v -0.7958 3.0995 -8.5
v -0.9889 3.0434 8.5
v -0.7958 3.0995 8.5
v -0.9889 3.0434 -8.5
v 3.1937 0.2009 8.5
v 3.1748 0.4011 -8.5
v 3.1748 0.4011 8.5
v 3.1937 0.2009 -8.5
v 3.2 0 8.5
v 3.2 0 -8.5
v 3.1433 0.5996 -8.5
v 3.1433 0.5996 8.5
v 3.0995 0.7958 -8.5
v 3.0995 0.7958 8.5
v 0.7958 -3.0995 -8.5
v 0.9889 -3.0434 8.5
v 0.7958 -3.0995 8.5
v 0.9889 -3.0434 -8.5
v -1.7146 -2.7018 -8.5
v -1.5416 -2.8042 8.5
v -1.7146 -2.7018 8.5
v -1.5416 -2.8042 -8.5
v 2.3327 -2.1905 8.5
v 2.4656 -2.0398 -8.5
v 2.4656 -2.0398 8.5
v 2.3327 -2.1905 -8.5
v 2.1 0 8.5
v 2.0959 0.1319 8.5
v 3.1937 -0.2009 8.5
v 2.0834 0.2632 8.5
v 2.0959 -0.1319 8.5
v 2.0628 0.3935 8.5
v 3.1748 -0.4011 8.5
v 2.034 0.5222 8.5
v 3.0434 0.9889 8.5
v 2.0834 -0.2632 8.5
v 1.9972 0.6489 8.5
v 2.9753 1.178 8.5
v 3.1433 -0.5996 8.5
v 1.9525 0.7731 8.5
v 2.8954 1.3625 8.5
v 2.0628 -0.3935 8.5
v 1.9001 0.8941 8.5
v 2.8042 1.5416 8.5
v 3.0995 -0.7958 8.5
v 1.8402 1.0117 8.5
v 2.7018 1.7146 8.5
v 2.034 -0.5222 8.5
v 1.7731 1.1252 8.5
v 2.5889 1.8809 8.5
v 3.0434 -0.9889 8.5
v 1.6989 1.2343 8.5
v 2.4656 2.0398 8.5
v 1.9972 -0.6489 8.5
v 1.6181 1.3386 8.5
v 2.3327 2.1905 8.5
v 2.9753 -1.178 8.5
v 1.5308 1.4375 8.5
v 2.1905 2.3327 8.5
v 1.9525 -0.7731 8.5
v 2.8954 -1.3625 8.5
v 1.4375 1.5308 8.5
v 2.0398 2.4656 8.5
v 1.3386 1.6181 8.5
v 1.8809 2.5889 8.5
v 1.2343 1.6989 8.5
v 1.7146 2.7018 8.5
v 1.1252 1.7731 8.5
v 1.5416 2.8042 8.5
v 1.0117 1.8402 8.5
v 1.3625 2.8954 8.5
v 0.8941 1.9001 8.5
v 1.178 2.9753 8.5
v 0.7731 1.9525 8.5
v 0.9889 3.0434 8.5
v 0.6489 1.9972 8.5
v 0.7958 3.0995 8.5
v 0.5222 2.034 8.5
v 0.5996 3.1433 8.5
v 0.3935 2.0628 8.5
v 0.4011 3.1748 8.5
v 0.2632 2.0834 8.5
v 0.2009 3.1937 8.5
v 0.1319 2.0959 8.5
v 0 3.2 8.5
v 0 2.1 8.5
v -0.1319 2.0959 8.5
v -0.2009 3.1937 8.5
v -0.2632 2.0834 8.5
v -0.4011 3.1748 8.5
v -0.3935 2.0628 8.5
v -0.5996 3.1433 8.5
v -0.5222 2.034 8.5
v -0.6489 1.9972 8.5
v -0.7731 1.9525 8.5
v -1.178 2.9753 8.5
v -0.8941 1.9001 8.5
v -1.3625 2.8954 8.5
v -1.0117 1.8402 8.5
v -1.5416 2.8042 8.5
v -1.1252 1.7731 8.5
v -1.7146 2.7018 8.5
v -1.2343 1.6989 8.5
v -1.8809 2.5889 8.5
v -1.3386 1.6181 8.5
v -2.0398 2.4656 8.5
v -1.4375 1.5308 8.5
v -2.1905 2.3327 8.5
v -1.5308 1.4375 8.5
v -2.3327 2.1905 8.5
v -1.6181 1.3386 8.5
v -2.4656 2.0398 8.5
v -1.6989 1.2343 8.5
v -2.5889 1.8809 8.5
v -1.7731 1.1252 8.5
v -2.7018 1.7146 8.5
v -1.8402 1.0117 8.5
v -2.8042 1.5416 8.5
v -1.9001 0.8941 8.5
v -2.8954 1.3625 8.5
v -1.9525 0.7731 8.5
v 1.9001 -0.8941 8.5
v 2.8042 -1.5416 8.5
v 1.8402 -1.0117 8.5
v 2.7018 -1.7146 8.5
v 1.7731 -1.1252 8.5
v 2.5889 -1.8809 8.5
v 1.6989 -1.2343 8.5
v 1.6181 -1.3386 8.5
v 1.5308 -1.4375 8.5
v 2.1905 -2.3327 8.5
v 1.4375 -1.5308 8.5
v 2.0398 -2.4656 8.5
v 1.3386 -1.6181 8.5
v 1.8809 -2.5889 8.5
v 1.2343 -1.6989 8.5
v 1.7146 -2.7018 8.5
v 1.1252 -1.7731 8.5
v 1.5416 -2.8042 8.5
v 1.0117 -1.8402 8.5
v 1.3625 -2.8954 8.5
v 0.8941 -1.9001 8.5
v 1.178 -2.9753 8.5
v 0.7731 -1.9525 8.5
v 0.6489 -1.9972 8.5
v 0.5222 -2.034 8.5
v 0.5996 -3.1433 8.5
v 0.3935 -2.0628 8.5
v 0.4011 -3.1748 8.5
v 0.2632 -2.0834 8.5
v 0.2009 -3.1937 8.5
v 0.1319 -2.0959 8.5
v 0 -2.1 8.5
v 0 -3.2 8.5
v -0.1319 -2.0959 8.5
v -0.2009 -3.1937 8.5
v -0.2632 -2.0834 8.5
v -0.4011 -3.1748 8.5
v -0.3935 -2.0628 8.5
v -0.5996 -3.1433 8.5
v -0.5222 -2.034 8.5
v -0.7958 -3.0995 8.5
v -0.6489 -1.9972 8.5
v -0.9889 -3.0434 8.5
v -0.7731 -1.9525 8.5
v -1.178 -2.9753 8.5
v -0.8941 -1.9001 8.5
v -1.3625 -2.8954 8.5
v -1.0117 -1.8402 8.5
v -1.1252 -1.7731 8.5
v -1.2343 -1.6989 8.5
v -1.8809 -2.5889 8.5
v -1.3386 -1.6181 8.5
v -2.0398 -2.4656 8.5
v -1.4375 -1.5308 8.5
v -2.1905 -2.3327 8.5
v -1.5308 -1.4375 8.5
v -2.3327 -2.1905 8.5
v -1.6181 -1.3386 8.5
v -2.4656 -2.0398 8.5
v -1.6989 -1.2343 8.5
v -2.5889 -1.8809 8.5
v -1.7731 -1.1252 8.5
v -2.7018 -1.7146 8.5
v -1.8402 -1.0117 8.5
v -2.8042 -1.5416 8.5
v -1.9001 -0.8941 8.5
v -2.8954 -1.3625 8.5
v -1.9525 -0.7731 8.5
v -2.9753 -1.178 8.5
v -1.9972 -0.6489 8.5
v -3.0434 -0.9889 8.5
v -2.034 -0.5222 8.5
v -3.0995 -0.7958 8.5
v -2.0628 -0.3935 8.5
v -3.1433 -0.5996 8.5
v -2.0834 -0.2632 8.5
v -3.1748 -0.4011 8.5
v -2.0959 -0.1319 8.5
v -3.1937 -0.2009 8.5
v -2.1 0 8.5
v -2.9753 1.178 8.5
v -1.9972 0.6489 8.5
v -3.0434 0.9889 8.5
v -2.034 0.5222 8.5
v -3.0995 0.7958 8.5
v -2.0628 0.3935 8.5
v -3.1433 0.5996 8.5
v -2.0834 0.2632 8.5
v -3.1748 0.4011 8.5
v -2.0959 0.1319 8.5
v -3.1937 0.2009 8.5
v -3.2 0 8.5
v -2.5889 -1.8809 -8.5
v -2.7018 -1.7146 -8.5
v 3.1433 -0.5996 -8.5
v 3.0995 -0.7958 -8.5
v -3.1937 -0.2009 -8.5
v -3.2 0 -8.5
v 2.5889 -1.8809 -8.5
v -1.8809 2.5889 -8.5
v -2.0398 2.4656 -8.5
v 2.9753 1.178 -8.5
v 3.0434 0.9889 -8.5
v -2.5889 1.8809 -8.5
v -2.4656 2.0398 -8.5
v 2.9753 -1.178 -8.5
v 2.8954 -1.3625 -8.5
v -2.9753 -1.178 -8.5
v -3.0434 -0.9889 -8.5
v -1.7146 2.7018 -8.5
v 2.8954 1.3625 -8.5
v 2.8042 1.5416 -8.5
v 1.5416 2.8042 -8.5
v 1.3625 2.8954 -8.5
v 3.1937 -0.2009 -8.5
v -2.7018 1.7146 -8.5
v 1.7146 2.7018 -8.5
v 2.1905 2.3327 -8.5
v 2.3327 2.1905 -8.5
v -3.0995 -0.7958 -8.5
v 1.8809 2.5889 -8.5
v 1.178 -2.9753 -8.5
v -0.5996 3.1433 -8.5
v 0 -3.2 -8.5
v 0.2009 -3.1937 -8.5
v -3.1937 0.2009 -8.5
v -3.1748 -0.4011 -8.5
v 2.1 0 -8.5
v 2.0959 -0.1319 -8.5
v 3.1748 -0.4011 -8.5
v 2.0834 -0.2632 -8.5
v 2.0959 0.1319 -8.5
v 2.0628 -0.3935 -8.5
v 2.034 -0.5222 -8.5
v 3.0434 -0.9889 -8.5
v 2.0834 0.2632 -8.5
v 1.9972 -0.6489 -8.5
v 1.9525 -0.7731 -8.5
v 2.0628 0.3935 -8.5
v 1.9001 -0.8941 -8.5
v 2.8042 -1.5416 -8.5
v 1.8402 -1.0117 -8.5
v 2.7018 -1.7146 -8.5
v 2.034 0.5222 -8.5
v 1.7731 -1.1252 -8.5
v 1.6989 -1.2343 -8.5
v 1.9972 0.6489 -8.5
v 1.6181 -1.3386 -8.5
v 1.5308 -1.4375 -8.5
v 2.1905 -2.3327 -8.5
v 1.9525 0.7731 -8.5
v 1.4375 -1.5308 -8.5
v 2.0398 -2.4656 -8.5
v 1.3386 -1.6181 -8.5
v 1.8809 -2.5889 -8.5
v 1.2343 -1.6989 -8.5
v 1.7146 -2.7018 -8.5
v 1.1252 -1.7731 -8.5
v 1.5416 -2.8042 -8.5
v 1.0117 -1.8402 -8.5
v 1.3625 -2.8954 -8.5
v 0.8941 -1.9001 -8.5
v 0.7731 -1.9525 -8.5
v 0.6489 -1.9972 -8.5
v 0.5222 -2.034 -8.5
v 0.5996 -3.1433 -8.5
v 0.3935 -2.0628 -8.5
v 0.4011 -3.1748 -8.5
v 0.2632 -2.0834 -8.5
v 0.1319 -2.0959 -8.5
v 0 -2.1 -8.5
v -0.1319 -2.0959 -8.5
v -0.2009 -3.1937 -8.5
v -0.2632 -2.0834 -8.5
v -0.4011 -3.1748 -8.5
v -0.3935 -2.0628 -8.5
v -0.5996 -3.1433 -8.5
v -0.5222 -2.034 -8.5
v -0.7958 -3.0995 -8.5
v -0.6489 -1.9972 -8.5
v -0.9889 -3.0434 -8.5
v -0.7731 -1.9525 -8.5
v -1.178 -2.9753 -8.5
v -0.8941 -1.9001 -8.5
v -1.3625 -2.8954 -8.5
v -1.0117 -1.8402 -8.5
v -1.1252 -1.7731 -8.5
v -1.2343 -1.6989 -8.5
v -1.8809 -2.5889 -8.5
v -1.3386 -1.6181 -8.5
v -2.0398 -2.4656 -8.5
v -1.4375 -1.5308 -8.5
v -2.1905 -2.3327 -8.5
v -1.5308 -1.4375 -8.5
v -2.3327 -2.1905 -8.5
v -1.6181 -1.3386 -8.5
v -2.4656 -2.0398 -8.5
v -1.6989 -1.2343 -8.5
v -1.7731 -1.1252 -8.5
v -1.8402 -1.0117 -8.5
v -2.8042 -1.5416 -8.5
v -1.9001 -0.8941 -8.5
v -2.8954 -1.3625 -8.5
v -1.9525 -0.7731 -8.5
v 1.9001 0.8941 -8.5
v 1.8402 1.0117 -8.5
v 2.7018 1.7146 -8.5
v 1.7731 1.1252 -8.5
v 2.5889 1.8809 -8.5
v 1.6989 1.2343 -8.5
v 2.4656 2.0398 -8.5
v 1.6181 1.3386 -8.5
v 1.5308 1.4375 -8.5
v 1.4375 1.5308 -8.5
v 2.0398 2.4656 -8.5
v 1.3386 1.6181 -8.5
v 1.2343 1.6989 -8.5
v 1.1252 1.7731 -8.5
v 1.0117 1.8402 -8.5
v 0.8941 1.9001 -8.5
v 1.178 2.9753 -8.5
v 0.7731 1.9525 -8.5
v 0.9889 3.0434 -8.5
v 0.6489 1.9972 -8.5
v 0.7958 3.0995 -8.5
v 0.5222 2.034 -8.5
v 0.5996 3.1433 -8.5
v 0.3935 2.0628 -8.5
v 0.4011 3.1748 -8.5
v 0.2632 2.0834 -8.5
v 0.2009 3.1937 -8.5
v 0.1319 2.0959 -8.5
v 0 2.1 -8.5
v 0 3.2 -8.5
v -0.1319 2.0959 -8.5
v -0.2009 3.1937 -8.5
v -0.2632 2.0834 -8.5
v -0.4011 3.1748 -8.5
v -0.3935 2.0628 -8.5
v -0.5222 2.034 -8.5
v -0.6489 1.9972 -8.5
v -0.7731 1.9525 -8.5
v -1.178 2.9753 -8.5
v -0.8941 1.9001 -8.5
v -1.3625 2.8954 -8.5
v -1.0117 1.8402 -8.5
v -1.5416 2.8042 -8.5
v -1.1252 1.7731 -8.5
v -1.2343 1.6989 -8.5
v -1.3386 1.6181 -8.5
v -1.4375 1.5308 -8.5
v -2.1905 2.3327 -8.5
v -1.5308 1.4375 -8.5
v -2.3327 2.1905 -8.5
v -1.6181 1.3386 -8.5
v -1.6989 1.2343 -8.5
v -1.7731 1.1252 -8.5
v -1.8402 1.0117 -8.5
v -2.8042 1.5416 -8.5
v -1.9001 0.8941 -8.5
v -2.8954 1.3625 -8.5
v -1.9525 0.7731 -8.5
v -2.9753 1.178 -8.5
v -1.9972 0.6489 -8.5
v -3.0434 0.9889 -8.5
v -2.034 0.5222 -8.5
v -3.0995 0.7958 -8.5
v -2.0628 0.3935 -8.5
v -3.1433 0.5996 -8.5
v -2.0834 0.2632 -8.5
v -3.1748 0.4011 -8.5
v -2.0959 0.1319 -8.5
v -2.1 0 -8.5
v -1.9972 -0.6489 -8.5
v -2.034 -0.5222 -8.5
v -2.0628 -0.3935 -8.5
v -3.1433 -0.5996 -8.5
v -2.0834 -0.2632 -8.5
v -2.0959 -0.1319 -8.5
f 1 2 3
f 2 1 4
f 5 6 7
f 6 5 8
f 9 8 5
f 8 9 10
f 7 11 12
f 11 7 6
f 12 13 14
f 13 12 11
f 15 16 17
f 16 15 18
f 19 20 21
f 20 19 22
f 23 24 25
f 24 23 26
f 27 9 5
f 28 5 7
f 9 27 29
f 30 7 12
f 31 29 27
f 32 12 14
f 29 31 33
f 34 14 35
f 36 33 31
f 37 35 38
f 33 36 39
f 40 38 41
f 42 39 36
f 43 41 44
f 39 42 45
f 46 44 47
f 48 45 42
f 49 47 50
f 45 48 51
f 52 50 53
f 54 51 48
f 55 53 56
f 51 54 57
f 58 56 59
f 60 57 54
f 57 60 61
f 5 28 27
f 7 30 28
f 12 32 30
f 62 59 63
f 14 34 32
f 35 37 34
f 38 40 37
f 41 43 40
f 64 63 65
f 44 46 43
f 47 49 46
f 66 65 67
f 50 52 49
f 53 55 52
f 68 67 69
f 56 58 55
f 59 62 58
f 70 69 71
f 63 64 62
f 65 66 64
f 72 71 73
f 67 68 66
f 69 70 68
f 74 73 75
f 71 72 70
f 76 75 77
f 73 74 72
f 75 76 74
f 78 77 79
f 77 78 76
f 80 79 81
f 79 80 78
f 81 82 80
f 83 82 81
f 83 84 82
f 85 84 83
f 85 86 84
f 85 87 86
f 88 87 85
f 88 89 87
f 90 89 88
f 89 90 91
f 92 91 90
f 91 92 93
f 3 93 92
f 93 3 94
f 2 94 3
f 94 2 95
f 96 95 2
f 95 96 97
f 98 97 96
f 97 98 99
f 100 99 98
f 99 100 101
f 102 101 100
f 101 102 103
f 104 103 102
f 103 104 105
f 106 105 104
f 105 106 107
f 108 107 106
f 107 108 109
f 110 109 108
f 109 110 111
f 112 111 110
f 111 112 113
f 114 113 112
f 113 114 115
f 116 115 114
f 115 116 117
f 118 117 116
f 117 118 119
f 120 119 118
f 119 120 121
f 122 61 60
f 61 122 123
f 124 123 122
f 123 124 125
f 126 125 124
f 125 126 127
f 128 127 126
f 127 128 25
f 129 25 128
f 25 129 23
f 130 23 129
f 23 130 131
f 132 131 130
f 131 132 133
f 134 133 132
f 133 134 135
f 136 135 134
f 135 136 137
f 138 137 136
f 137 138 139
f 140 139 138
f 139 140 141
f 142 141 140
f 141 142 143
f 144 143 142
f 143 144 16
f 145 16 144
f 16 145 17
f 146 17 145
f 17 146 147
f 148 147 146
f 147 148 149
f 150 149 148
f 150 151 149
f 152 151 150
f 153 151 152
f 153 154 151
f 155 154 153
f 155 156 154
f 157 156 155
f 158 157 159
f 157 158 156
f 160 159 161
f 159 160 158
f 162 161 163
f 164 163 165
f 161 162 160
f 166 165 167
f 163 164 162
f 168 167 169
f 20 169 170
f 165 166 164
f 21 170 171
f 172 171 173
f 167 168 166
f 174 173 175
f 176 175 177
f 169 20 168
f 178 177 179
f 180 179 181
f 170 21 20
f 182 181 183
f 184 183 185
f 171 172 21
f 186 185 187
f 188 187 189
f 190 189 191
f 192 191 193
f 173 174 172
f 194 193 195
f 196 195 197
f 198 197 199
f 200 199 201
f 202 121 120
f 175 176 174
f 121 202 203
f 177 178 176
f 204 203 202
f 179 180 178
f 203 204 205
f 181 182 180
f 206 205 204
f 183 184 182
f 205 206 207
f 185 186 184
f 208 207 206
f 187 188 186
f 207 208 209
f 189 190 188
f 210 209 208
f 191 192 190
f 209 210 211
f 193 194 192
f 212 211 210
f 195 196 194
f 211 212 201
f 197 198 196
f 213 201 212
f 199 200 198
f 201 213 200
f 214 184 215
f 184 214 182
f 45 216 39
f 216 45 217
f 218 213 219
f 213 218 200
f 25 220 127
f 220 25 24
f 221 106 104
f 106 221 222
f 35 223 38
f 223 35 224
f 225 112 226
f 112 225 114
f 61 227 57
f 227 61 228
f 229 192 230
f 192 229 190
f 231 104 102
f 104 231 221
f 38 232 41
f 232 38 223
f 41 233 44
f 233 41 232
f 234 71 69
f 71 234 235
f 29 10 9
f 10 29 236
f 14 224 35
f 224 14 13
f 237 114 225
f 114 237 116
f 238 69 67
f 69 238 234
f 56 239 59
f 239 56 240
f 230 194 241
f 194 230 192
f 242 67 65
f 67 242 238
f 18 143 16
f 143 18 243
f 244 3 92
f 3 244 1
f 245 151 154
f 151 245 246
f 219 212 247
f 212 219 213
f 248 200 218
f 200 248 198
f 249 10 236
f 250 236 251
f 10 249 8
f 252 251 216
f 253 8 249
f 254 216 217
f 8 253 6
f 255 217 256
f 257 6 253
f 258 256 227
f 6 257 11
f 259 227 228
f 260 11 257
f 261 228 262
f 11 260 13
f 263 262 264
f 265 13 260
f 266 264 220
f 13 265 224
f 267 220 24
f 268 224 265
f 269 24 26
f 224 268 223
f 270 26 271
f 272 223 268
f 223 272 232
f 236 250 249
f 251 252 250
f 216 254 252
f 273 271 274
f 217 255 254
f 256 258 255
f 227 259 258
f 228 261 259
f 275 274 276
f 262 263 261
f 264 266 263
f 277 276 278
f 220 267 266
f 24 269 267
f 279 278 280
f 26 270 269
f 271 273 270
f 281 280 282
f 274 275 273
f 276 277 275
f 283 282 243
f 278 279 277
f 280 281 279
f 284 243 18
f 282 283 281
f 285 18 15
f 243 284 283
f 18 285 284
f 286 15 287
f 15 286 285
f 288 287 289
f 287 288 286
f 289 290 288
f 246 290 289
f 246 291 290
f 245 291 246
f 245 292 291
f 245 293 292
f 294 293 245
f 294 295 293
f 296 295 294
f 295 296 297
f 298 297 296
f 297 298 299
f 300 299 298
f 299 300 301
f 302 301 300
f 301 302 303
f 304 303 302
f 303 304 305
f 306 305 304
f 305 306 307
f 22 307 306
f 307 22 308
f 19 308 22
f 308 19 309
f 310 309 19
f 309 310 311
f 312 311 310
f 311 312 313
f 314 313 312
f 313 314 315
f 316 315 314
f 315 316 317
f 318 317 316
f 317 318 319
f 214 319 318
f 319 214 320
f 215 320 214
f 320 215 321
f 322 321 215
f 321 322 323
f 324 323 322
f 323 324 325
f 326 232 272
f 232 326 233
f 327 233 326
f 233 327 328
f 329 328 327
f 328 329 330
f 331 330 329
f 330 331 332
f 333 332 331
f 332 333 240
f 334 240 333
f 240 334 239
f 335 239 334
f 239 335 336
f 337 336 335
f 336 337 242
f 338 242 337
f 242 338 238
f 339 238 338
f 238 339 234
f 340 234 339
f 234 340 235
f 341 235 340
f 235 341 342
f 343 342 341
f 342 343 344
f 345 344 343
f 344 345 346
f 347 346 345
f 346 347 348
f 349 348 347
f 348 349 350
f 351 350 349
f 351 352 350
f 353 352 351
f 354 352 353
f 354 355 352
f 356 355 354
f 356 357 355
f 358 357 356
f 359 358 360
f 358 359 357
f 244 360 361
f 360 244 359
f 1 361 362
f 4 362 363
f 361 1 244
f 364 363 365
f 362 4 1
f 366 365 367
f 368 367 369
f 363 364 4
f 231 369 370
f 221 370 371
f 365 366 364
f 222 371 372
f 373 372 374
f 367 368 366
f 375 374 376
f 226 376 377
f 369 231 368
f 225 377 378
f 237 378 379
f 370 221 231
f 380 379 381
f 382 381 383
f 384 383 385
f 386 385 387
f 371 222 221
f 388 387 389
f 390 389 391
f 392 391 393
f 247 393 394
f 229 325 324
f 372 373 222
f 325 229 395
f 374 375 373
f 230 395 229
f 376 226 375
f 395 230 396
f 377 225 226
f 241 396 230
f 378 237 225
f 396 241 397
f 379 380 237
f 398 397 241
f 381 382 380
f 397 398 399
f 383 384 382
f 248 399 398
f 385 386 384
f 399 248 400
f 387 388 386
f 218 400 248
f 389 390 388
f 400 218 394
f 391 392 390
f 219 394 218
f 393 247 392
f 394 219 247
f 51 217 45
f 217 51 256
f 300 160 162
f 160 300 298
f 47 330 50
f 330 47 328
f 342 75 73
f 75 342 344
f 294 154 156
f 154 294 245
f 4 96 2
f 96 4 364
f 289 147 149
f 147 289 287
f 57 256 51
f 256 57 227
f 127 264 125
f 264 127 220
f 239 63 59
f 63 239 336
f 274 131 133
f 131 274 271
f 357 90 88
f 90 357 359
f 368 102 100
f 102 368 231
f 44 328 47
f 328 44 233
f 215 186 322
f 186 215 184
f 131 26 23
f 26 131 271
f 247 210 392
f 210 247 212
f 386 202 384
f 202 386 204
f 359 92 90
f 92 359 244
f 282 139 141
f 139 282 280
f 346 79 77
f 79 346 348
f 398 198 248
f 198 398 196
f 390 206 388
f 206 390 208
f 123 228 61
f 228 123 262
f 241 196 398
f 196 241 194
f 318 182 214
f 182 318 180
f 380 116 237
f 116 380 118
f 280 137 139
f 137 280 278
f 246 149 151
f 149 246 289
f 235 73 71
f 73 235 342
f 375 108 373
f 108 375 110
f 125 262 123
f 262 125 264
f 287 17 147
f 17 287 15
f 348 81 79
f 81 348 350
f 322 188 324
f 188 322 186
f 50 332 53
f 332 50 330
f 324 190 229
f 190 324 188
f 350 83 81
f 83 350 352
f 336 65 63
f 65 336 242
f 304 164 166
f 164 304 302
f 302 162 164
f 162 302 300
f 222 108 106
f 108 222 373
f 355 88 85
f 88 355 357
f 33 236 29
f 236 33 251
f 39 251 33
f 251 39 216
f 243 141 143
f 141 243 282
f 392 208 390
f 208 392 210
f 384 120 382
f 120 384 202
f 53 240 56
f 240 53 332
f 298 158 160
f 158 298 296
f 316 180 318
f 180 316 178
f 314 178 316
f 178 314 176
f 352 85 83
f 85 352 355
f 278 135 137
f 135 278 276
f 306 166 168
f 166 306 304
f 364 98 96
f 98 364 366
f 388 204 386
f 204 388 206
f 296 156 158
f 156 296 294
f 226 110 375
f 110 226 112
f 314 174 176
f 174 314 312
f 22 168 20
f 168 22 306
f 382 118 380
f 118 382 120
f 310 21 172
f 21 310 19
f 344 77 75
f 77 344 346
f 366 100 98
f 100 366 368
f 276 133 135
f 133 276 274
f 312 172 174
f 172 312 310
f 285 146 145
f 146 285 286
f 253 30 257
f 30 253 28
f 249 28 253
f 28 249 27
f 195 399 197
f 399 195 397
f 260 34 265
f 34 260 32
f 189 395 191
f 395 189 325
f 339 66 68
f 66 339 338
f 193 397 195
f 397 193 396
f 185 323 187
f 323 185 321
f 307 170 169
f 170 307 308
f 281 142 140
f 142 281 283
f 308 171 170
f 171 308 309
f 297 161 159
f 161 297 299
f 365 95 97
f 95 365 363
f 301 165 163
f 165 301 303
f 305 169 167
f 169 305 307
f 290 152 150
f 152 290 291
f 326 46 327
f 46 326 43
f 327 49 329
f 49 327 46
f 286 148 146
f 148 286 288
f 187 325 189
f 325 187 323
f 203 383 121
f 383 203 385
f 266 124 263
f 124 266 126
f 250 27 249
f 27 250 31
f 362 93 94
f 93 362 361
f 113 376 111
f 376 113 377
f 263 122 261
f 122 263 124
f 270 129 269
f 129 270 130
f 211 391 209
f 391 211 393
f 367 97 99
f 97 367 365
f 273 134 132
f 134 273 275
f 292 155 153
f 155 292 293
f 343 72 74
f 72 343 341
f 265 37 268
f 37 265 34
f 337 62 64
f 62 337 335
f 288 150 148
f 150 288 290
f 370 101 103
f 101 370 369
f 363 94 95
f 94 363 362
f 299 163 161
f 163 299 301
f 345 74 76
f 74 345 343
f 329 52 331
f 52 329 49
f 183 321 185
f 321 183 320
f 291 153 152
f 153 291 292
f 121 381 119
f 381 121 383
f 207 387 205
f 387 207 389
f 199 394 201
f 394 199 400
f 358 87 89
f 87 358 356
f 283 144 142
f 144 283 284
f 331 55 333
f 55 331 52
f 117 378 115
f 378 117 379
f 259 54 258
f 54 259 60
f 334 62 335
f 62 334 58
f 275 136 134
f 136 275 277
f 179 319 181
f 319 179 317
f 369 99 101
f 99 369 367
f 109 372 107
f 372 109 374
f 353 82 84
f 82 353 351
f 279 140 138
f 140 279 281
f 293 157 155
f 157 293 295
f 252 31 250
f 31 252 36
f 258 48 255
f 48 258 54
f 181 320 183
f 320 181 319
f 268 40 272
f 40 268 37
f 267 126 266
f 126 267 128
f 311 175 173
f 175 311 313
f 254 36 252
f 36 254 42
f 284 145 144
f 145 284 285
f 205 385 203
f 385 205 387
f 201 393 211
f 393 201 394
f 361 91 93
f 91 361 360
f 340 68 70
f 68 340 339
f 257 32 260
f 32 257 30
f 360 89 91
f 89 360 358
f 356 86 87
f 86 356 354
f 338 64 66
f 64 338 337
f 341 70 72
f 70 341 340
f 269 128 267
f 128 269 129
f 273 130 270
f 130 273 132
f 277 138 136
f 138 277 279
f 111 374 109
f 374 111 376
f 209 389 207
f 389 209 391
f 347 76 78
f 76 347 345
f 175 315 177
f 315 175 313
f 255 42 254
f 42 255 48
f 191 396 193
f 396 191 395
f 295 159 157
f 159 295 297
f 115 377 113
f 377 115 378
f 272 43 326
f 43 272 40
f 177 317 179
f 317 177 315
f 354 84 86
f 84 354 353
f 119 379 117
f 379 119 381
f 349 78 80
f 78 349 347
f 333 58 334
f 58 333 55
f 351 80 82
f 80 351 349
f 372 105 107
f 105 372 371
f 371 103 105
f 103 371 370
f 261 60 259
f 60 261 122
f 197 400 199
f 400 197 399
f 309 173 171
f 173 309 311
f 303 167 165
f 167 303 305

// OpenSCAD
r_screw=4;

w_fan=79;
d_fan=79;
h_fan=15;

w_sink=76;
d_sink=68;
h_sink=44;

d=0.01;
wall=5;


r_base=8;
h_base=wall;


d_screw=72;
//
/*
h_support=h_fan+2*wall;
r_fan=w_fan/2;
difference(){
    translate([0, 0, h_support/2]) cube([w_fan+wall*2, d_fan+wall*2, h_support], center=true);
    
    cylinder(h=w_fan*2, r=r_fan, $fn=100, center=true);
    translate([0,-35+wall,wall*1.5+h_fan/2+d]) cube([w_fan*2, d_fan/4, h_fan+wall], center=true);
    translate([0,35-wall,wall*1.5+h_fan/2+d]) cube([w_fan*2, d_fan/4, h_fan+wall], center=true);
    //translate([-d_fan/2,0,wall*1.5+h_fan/2+d]) cube([w_fan/1.25, d_fan*2, h_fan+wall], center=true);
    
    translate([0,-35,wall*1.5+h_fan/2+d+wall]) cube([w_fan*2, d_fan/4, h_fan+wall], center=true);
    translate([0,35,wall*1.5+h_fan/2+d+wall]) cube([w_fan*2, d_fan/4, h_fan+wall], center=true);
    
    translate([105,-35,wall*1.5+h_fan/2+d]) cube([w_fan*2, d_fan/4, h_fan+wall], center=true);
    translate([105,35,wall*1.5+h_fan/2+d]) cube([w_fan*2, d_fan/4, h_fan+wall], center=true);
        
    translate([-105,-35,wall*1.5+h_fan/2+d]) cube([w_fan*2, d_fan/4, h_fan+wall], center=true);
    translate([-105,35,wall*1.5+h_fan/2+d]) cube([w_fan*2, d_fan/4, h_fan+wall], center=true);
    
   translate([0, 0, h_sink/2+wall]) cube([w_sink, d_sink, h_sink], center=true);
    
    translate([-d_screw/2, d_screw/2,  2]) cylinder(h=h_fan, r=r_screw, $fn=100, center=true);
    translate([d_screw/2, d_screw/2,  2]) cylinder(h=h_fan, r=r_screw, $fn=100, center=true);
    translate([d_screw/2, -d_screw/2,  2]) cylinder(h=h_fan, r=r_screw, $fn=100, center=true);
    translate([-d_screw/2, -d_screw/2, 2]) cylinder(h=h_fan, r=r_screw, $fn=100, center=true);
}
*/


//#translate([0, 0, -h_fan/2+d-wall/2]) cube([w_fan, d_fan, h_fan+wall], center=true);

/*
projection(cut = false) difference(){
    union(){
        translate([-d_screw/2, d_screw/2, -h_fan-wall*1.5]) cylinder(r=r_base, h=h_base, $fn=100, center=true);
        //translate([-d_screw/2, -d_screw/2, -h_fan-wall*1.5]) cylinder(r=r_base, h=h_base, $fn=100, center=true);
        //translate([d_screw/2, d_screw/2, -h_fan-wall*1.5]) cylinder(r=r_base, h=h_base, $fn=100, center=true);
        //translate([d_screw/2, -d_screw/2, -h_fan-wall*1.5]) cylinder(r=r_base, h=h_base, $fn=100, center=true);
    }
    translate([-d_screw/2, d_screw/2,  -h_fan*1.5]) cylinder(h=h_fan, r=r_screw, $fn=100, center=true);
    //translate([d_screw/2, d_screw/2,  -h_fan*1.5]) cylinder(h=h_fan, r=r_screw, $fn=100, center=true);
    //translate([d_screw/2, -d_screw/2,  -h_fan*1.5]) cylinder(h=h_fan, r=r_screw, $fn=100, center=true);
    //translate([-d_screw/2, -d_screw/2, -h_fan*1.5]) cylinder(h=h_fan, r=r_screw, $fn=100, center=true);
    
}
*/

//projection(cut = false) 
difference(){
cylinder(r=3.2, h=17, $fn=100, center=true);
cylinder(r=2.1, h=18, $fn=100, center=true);
    
}
